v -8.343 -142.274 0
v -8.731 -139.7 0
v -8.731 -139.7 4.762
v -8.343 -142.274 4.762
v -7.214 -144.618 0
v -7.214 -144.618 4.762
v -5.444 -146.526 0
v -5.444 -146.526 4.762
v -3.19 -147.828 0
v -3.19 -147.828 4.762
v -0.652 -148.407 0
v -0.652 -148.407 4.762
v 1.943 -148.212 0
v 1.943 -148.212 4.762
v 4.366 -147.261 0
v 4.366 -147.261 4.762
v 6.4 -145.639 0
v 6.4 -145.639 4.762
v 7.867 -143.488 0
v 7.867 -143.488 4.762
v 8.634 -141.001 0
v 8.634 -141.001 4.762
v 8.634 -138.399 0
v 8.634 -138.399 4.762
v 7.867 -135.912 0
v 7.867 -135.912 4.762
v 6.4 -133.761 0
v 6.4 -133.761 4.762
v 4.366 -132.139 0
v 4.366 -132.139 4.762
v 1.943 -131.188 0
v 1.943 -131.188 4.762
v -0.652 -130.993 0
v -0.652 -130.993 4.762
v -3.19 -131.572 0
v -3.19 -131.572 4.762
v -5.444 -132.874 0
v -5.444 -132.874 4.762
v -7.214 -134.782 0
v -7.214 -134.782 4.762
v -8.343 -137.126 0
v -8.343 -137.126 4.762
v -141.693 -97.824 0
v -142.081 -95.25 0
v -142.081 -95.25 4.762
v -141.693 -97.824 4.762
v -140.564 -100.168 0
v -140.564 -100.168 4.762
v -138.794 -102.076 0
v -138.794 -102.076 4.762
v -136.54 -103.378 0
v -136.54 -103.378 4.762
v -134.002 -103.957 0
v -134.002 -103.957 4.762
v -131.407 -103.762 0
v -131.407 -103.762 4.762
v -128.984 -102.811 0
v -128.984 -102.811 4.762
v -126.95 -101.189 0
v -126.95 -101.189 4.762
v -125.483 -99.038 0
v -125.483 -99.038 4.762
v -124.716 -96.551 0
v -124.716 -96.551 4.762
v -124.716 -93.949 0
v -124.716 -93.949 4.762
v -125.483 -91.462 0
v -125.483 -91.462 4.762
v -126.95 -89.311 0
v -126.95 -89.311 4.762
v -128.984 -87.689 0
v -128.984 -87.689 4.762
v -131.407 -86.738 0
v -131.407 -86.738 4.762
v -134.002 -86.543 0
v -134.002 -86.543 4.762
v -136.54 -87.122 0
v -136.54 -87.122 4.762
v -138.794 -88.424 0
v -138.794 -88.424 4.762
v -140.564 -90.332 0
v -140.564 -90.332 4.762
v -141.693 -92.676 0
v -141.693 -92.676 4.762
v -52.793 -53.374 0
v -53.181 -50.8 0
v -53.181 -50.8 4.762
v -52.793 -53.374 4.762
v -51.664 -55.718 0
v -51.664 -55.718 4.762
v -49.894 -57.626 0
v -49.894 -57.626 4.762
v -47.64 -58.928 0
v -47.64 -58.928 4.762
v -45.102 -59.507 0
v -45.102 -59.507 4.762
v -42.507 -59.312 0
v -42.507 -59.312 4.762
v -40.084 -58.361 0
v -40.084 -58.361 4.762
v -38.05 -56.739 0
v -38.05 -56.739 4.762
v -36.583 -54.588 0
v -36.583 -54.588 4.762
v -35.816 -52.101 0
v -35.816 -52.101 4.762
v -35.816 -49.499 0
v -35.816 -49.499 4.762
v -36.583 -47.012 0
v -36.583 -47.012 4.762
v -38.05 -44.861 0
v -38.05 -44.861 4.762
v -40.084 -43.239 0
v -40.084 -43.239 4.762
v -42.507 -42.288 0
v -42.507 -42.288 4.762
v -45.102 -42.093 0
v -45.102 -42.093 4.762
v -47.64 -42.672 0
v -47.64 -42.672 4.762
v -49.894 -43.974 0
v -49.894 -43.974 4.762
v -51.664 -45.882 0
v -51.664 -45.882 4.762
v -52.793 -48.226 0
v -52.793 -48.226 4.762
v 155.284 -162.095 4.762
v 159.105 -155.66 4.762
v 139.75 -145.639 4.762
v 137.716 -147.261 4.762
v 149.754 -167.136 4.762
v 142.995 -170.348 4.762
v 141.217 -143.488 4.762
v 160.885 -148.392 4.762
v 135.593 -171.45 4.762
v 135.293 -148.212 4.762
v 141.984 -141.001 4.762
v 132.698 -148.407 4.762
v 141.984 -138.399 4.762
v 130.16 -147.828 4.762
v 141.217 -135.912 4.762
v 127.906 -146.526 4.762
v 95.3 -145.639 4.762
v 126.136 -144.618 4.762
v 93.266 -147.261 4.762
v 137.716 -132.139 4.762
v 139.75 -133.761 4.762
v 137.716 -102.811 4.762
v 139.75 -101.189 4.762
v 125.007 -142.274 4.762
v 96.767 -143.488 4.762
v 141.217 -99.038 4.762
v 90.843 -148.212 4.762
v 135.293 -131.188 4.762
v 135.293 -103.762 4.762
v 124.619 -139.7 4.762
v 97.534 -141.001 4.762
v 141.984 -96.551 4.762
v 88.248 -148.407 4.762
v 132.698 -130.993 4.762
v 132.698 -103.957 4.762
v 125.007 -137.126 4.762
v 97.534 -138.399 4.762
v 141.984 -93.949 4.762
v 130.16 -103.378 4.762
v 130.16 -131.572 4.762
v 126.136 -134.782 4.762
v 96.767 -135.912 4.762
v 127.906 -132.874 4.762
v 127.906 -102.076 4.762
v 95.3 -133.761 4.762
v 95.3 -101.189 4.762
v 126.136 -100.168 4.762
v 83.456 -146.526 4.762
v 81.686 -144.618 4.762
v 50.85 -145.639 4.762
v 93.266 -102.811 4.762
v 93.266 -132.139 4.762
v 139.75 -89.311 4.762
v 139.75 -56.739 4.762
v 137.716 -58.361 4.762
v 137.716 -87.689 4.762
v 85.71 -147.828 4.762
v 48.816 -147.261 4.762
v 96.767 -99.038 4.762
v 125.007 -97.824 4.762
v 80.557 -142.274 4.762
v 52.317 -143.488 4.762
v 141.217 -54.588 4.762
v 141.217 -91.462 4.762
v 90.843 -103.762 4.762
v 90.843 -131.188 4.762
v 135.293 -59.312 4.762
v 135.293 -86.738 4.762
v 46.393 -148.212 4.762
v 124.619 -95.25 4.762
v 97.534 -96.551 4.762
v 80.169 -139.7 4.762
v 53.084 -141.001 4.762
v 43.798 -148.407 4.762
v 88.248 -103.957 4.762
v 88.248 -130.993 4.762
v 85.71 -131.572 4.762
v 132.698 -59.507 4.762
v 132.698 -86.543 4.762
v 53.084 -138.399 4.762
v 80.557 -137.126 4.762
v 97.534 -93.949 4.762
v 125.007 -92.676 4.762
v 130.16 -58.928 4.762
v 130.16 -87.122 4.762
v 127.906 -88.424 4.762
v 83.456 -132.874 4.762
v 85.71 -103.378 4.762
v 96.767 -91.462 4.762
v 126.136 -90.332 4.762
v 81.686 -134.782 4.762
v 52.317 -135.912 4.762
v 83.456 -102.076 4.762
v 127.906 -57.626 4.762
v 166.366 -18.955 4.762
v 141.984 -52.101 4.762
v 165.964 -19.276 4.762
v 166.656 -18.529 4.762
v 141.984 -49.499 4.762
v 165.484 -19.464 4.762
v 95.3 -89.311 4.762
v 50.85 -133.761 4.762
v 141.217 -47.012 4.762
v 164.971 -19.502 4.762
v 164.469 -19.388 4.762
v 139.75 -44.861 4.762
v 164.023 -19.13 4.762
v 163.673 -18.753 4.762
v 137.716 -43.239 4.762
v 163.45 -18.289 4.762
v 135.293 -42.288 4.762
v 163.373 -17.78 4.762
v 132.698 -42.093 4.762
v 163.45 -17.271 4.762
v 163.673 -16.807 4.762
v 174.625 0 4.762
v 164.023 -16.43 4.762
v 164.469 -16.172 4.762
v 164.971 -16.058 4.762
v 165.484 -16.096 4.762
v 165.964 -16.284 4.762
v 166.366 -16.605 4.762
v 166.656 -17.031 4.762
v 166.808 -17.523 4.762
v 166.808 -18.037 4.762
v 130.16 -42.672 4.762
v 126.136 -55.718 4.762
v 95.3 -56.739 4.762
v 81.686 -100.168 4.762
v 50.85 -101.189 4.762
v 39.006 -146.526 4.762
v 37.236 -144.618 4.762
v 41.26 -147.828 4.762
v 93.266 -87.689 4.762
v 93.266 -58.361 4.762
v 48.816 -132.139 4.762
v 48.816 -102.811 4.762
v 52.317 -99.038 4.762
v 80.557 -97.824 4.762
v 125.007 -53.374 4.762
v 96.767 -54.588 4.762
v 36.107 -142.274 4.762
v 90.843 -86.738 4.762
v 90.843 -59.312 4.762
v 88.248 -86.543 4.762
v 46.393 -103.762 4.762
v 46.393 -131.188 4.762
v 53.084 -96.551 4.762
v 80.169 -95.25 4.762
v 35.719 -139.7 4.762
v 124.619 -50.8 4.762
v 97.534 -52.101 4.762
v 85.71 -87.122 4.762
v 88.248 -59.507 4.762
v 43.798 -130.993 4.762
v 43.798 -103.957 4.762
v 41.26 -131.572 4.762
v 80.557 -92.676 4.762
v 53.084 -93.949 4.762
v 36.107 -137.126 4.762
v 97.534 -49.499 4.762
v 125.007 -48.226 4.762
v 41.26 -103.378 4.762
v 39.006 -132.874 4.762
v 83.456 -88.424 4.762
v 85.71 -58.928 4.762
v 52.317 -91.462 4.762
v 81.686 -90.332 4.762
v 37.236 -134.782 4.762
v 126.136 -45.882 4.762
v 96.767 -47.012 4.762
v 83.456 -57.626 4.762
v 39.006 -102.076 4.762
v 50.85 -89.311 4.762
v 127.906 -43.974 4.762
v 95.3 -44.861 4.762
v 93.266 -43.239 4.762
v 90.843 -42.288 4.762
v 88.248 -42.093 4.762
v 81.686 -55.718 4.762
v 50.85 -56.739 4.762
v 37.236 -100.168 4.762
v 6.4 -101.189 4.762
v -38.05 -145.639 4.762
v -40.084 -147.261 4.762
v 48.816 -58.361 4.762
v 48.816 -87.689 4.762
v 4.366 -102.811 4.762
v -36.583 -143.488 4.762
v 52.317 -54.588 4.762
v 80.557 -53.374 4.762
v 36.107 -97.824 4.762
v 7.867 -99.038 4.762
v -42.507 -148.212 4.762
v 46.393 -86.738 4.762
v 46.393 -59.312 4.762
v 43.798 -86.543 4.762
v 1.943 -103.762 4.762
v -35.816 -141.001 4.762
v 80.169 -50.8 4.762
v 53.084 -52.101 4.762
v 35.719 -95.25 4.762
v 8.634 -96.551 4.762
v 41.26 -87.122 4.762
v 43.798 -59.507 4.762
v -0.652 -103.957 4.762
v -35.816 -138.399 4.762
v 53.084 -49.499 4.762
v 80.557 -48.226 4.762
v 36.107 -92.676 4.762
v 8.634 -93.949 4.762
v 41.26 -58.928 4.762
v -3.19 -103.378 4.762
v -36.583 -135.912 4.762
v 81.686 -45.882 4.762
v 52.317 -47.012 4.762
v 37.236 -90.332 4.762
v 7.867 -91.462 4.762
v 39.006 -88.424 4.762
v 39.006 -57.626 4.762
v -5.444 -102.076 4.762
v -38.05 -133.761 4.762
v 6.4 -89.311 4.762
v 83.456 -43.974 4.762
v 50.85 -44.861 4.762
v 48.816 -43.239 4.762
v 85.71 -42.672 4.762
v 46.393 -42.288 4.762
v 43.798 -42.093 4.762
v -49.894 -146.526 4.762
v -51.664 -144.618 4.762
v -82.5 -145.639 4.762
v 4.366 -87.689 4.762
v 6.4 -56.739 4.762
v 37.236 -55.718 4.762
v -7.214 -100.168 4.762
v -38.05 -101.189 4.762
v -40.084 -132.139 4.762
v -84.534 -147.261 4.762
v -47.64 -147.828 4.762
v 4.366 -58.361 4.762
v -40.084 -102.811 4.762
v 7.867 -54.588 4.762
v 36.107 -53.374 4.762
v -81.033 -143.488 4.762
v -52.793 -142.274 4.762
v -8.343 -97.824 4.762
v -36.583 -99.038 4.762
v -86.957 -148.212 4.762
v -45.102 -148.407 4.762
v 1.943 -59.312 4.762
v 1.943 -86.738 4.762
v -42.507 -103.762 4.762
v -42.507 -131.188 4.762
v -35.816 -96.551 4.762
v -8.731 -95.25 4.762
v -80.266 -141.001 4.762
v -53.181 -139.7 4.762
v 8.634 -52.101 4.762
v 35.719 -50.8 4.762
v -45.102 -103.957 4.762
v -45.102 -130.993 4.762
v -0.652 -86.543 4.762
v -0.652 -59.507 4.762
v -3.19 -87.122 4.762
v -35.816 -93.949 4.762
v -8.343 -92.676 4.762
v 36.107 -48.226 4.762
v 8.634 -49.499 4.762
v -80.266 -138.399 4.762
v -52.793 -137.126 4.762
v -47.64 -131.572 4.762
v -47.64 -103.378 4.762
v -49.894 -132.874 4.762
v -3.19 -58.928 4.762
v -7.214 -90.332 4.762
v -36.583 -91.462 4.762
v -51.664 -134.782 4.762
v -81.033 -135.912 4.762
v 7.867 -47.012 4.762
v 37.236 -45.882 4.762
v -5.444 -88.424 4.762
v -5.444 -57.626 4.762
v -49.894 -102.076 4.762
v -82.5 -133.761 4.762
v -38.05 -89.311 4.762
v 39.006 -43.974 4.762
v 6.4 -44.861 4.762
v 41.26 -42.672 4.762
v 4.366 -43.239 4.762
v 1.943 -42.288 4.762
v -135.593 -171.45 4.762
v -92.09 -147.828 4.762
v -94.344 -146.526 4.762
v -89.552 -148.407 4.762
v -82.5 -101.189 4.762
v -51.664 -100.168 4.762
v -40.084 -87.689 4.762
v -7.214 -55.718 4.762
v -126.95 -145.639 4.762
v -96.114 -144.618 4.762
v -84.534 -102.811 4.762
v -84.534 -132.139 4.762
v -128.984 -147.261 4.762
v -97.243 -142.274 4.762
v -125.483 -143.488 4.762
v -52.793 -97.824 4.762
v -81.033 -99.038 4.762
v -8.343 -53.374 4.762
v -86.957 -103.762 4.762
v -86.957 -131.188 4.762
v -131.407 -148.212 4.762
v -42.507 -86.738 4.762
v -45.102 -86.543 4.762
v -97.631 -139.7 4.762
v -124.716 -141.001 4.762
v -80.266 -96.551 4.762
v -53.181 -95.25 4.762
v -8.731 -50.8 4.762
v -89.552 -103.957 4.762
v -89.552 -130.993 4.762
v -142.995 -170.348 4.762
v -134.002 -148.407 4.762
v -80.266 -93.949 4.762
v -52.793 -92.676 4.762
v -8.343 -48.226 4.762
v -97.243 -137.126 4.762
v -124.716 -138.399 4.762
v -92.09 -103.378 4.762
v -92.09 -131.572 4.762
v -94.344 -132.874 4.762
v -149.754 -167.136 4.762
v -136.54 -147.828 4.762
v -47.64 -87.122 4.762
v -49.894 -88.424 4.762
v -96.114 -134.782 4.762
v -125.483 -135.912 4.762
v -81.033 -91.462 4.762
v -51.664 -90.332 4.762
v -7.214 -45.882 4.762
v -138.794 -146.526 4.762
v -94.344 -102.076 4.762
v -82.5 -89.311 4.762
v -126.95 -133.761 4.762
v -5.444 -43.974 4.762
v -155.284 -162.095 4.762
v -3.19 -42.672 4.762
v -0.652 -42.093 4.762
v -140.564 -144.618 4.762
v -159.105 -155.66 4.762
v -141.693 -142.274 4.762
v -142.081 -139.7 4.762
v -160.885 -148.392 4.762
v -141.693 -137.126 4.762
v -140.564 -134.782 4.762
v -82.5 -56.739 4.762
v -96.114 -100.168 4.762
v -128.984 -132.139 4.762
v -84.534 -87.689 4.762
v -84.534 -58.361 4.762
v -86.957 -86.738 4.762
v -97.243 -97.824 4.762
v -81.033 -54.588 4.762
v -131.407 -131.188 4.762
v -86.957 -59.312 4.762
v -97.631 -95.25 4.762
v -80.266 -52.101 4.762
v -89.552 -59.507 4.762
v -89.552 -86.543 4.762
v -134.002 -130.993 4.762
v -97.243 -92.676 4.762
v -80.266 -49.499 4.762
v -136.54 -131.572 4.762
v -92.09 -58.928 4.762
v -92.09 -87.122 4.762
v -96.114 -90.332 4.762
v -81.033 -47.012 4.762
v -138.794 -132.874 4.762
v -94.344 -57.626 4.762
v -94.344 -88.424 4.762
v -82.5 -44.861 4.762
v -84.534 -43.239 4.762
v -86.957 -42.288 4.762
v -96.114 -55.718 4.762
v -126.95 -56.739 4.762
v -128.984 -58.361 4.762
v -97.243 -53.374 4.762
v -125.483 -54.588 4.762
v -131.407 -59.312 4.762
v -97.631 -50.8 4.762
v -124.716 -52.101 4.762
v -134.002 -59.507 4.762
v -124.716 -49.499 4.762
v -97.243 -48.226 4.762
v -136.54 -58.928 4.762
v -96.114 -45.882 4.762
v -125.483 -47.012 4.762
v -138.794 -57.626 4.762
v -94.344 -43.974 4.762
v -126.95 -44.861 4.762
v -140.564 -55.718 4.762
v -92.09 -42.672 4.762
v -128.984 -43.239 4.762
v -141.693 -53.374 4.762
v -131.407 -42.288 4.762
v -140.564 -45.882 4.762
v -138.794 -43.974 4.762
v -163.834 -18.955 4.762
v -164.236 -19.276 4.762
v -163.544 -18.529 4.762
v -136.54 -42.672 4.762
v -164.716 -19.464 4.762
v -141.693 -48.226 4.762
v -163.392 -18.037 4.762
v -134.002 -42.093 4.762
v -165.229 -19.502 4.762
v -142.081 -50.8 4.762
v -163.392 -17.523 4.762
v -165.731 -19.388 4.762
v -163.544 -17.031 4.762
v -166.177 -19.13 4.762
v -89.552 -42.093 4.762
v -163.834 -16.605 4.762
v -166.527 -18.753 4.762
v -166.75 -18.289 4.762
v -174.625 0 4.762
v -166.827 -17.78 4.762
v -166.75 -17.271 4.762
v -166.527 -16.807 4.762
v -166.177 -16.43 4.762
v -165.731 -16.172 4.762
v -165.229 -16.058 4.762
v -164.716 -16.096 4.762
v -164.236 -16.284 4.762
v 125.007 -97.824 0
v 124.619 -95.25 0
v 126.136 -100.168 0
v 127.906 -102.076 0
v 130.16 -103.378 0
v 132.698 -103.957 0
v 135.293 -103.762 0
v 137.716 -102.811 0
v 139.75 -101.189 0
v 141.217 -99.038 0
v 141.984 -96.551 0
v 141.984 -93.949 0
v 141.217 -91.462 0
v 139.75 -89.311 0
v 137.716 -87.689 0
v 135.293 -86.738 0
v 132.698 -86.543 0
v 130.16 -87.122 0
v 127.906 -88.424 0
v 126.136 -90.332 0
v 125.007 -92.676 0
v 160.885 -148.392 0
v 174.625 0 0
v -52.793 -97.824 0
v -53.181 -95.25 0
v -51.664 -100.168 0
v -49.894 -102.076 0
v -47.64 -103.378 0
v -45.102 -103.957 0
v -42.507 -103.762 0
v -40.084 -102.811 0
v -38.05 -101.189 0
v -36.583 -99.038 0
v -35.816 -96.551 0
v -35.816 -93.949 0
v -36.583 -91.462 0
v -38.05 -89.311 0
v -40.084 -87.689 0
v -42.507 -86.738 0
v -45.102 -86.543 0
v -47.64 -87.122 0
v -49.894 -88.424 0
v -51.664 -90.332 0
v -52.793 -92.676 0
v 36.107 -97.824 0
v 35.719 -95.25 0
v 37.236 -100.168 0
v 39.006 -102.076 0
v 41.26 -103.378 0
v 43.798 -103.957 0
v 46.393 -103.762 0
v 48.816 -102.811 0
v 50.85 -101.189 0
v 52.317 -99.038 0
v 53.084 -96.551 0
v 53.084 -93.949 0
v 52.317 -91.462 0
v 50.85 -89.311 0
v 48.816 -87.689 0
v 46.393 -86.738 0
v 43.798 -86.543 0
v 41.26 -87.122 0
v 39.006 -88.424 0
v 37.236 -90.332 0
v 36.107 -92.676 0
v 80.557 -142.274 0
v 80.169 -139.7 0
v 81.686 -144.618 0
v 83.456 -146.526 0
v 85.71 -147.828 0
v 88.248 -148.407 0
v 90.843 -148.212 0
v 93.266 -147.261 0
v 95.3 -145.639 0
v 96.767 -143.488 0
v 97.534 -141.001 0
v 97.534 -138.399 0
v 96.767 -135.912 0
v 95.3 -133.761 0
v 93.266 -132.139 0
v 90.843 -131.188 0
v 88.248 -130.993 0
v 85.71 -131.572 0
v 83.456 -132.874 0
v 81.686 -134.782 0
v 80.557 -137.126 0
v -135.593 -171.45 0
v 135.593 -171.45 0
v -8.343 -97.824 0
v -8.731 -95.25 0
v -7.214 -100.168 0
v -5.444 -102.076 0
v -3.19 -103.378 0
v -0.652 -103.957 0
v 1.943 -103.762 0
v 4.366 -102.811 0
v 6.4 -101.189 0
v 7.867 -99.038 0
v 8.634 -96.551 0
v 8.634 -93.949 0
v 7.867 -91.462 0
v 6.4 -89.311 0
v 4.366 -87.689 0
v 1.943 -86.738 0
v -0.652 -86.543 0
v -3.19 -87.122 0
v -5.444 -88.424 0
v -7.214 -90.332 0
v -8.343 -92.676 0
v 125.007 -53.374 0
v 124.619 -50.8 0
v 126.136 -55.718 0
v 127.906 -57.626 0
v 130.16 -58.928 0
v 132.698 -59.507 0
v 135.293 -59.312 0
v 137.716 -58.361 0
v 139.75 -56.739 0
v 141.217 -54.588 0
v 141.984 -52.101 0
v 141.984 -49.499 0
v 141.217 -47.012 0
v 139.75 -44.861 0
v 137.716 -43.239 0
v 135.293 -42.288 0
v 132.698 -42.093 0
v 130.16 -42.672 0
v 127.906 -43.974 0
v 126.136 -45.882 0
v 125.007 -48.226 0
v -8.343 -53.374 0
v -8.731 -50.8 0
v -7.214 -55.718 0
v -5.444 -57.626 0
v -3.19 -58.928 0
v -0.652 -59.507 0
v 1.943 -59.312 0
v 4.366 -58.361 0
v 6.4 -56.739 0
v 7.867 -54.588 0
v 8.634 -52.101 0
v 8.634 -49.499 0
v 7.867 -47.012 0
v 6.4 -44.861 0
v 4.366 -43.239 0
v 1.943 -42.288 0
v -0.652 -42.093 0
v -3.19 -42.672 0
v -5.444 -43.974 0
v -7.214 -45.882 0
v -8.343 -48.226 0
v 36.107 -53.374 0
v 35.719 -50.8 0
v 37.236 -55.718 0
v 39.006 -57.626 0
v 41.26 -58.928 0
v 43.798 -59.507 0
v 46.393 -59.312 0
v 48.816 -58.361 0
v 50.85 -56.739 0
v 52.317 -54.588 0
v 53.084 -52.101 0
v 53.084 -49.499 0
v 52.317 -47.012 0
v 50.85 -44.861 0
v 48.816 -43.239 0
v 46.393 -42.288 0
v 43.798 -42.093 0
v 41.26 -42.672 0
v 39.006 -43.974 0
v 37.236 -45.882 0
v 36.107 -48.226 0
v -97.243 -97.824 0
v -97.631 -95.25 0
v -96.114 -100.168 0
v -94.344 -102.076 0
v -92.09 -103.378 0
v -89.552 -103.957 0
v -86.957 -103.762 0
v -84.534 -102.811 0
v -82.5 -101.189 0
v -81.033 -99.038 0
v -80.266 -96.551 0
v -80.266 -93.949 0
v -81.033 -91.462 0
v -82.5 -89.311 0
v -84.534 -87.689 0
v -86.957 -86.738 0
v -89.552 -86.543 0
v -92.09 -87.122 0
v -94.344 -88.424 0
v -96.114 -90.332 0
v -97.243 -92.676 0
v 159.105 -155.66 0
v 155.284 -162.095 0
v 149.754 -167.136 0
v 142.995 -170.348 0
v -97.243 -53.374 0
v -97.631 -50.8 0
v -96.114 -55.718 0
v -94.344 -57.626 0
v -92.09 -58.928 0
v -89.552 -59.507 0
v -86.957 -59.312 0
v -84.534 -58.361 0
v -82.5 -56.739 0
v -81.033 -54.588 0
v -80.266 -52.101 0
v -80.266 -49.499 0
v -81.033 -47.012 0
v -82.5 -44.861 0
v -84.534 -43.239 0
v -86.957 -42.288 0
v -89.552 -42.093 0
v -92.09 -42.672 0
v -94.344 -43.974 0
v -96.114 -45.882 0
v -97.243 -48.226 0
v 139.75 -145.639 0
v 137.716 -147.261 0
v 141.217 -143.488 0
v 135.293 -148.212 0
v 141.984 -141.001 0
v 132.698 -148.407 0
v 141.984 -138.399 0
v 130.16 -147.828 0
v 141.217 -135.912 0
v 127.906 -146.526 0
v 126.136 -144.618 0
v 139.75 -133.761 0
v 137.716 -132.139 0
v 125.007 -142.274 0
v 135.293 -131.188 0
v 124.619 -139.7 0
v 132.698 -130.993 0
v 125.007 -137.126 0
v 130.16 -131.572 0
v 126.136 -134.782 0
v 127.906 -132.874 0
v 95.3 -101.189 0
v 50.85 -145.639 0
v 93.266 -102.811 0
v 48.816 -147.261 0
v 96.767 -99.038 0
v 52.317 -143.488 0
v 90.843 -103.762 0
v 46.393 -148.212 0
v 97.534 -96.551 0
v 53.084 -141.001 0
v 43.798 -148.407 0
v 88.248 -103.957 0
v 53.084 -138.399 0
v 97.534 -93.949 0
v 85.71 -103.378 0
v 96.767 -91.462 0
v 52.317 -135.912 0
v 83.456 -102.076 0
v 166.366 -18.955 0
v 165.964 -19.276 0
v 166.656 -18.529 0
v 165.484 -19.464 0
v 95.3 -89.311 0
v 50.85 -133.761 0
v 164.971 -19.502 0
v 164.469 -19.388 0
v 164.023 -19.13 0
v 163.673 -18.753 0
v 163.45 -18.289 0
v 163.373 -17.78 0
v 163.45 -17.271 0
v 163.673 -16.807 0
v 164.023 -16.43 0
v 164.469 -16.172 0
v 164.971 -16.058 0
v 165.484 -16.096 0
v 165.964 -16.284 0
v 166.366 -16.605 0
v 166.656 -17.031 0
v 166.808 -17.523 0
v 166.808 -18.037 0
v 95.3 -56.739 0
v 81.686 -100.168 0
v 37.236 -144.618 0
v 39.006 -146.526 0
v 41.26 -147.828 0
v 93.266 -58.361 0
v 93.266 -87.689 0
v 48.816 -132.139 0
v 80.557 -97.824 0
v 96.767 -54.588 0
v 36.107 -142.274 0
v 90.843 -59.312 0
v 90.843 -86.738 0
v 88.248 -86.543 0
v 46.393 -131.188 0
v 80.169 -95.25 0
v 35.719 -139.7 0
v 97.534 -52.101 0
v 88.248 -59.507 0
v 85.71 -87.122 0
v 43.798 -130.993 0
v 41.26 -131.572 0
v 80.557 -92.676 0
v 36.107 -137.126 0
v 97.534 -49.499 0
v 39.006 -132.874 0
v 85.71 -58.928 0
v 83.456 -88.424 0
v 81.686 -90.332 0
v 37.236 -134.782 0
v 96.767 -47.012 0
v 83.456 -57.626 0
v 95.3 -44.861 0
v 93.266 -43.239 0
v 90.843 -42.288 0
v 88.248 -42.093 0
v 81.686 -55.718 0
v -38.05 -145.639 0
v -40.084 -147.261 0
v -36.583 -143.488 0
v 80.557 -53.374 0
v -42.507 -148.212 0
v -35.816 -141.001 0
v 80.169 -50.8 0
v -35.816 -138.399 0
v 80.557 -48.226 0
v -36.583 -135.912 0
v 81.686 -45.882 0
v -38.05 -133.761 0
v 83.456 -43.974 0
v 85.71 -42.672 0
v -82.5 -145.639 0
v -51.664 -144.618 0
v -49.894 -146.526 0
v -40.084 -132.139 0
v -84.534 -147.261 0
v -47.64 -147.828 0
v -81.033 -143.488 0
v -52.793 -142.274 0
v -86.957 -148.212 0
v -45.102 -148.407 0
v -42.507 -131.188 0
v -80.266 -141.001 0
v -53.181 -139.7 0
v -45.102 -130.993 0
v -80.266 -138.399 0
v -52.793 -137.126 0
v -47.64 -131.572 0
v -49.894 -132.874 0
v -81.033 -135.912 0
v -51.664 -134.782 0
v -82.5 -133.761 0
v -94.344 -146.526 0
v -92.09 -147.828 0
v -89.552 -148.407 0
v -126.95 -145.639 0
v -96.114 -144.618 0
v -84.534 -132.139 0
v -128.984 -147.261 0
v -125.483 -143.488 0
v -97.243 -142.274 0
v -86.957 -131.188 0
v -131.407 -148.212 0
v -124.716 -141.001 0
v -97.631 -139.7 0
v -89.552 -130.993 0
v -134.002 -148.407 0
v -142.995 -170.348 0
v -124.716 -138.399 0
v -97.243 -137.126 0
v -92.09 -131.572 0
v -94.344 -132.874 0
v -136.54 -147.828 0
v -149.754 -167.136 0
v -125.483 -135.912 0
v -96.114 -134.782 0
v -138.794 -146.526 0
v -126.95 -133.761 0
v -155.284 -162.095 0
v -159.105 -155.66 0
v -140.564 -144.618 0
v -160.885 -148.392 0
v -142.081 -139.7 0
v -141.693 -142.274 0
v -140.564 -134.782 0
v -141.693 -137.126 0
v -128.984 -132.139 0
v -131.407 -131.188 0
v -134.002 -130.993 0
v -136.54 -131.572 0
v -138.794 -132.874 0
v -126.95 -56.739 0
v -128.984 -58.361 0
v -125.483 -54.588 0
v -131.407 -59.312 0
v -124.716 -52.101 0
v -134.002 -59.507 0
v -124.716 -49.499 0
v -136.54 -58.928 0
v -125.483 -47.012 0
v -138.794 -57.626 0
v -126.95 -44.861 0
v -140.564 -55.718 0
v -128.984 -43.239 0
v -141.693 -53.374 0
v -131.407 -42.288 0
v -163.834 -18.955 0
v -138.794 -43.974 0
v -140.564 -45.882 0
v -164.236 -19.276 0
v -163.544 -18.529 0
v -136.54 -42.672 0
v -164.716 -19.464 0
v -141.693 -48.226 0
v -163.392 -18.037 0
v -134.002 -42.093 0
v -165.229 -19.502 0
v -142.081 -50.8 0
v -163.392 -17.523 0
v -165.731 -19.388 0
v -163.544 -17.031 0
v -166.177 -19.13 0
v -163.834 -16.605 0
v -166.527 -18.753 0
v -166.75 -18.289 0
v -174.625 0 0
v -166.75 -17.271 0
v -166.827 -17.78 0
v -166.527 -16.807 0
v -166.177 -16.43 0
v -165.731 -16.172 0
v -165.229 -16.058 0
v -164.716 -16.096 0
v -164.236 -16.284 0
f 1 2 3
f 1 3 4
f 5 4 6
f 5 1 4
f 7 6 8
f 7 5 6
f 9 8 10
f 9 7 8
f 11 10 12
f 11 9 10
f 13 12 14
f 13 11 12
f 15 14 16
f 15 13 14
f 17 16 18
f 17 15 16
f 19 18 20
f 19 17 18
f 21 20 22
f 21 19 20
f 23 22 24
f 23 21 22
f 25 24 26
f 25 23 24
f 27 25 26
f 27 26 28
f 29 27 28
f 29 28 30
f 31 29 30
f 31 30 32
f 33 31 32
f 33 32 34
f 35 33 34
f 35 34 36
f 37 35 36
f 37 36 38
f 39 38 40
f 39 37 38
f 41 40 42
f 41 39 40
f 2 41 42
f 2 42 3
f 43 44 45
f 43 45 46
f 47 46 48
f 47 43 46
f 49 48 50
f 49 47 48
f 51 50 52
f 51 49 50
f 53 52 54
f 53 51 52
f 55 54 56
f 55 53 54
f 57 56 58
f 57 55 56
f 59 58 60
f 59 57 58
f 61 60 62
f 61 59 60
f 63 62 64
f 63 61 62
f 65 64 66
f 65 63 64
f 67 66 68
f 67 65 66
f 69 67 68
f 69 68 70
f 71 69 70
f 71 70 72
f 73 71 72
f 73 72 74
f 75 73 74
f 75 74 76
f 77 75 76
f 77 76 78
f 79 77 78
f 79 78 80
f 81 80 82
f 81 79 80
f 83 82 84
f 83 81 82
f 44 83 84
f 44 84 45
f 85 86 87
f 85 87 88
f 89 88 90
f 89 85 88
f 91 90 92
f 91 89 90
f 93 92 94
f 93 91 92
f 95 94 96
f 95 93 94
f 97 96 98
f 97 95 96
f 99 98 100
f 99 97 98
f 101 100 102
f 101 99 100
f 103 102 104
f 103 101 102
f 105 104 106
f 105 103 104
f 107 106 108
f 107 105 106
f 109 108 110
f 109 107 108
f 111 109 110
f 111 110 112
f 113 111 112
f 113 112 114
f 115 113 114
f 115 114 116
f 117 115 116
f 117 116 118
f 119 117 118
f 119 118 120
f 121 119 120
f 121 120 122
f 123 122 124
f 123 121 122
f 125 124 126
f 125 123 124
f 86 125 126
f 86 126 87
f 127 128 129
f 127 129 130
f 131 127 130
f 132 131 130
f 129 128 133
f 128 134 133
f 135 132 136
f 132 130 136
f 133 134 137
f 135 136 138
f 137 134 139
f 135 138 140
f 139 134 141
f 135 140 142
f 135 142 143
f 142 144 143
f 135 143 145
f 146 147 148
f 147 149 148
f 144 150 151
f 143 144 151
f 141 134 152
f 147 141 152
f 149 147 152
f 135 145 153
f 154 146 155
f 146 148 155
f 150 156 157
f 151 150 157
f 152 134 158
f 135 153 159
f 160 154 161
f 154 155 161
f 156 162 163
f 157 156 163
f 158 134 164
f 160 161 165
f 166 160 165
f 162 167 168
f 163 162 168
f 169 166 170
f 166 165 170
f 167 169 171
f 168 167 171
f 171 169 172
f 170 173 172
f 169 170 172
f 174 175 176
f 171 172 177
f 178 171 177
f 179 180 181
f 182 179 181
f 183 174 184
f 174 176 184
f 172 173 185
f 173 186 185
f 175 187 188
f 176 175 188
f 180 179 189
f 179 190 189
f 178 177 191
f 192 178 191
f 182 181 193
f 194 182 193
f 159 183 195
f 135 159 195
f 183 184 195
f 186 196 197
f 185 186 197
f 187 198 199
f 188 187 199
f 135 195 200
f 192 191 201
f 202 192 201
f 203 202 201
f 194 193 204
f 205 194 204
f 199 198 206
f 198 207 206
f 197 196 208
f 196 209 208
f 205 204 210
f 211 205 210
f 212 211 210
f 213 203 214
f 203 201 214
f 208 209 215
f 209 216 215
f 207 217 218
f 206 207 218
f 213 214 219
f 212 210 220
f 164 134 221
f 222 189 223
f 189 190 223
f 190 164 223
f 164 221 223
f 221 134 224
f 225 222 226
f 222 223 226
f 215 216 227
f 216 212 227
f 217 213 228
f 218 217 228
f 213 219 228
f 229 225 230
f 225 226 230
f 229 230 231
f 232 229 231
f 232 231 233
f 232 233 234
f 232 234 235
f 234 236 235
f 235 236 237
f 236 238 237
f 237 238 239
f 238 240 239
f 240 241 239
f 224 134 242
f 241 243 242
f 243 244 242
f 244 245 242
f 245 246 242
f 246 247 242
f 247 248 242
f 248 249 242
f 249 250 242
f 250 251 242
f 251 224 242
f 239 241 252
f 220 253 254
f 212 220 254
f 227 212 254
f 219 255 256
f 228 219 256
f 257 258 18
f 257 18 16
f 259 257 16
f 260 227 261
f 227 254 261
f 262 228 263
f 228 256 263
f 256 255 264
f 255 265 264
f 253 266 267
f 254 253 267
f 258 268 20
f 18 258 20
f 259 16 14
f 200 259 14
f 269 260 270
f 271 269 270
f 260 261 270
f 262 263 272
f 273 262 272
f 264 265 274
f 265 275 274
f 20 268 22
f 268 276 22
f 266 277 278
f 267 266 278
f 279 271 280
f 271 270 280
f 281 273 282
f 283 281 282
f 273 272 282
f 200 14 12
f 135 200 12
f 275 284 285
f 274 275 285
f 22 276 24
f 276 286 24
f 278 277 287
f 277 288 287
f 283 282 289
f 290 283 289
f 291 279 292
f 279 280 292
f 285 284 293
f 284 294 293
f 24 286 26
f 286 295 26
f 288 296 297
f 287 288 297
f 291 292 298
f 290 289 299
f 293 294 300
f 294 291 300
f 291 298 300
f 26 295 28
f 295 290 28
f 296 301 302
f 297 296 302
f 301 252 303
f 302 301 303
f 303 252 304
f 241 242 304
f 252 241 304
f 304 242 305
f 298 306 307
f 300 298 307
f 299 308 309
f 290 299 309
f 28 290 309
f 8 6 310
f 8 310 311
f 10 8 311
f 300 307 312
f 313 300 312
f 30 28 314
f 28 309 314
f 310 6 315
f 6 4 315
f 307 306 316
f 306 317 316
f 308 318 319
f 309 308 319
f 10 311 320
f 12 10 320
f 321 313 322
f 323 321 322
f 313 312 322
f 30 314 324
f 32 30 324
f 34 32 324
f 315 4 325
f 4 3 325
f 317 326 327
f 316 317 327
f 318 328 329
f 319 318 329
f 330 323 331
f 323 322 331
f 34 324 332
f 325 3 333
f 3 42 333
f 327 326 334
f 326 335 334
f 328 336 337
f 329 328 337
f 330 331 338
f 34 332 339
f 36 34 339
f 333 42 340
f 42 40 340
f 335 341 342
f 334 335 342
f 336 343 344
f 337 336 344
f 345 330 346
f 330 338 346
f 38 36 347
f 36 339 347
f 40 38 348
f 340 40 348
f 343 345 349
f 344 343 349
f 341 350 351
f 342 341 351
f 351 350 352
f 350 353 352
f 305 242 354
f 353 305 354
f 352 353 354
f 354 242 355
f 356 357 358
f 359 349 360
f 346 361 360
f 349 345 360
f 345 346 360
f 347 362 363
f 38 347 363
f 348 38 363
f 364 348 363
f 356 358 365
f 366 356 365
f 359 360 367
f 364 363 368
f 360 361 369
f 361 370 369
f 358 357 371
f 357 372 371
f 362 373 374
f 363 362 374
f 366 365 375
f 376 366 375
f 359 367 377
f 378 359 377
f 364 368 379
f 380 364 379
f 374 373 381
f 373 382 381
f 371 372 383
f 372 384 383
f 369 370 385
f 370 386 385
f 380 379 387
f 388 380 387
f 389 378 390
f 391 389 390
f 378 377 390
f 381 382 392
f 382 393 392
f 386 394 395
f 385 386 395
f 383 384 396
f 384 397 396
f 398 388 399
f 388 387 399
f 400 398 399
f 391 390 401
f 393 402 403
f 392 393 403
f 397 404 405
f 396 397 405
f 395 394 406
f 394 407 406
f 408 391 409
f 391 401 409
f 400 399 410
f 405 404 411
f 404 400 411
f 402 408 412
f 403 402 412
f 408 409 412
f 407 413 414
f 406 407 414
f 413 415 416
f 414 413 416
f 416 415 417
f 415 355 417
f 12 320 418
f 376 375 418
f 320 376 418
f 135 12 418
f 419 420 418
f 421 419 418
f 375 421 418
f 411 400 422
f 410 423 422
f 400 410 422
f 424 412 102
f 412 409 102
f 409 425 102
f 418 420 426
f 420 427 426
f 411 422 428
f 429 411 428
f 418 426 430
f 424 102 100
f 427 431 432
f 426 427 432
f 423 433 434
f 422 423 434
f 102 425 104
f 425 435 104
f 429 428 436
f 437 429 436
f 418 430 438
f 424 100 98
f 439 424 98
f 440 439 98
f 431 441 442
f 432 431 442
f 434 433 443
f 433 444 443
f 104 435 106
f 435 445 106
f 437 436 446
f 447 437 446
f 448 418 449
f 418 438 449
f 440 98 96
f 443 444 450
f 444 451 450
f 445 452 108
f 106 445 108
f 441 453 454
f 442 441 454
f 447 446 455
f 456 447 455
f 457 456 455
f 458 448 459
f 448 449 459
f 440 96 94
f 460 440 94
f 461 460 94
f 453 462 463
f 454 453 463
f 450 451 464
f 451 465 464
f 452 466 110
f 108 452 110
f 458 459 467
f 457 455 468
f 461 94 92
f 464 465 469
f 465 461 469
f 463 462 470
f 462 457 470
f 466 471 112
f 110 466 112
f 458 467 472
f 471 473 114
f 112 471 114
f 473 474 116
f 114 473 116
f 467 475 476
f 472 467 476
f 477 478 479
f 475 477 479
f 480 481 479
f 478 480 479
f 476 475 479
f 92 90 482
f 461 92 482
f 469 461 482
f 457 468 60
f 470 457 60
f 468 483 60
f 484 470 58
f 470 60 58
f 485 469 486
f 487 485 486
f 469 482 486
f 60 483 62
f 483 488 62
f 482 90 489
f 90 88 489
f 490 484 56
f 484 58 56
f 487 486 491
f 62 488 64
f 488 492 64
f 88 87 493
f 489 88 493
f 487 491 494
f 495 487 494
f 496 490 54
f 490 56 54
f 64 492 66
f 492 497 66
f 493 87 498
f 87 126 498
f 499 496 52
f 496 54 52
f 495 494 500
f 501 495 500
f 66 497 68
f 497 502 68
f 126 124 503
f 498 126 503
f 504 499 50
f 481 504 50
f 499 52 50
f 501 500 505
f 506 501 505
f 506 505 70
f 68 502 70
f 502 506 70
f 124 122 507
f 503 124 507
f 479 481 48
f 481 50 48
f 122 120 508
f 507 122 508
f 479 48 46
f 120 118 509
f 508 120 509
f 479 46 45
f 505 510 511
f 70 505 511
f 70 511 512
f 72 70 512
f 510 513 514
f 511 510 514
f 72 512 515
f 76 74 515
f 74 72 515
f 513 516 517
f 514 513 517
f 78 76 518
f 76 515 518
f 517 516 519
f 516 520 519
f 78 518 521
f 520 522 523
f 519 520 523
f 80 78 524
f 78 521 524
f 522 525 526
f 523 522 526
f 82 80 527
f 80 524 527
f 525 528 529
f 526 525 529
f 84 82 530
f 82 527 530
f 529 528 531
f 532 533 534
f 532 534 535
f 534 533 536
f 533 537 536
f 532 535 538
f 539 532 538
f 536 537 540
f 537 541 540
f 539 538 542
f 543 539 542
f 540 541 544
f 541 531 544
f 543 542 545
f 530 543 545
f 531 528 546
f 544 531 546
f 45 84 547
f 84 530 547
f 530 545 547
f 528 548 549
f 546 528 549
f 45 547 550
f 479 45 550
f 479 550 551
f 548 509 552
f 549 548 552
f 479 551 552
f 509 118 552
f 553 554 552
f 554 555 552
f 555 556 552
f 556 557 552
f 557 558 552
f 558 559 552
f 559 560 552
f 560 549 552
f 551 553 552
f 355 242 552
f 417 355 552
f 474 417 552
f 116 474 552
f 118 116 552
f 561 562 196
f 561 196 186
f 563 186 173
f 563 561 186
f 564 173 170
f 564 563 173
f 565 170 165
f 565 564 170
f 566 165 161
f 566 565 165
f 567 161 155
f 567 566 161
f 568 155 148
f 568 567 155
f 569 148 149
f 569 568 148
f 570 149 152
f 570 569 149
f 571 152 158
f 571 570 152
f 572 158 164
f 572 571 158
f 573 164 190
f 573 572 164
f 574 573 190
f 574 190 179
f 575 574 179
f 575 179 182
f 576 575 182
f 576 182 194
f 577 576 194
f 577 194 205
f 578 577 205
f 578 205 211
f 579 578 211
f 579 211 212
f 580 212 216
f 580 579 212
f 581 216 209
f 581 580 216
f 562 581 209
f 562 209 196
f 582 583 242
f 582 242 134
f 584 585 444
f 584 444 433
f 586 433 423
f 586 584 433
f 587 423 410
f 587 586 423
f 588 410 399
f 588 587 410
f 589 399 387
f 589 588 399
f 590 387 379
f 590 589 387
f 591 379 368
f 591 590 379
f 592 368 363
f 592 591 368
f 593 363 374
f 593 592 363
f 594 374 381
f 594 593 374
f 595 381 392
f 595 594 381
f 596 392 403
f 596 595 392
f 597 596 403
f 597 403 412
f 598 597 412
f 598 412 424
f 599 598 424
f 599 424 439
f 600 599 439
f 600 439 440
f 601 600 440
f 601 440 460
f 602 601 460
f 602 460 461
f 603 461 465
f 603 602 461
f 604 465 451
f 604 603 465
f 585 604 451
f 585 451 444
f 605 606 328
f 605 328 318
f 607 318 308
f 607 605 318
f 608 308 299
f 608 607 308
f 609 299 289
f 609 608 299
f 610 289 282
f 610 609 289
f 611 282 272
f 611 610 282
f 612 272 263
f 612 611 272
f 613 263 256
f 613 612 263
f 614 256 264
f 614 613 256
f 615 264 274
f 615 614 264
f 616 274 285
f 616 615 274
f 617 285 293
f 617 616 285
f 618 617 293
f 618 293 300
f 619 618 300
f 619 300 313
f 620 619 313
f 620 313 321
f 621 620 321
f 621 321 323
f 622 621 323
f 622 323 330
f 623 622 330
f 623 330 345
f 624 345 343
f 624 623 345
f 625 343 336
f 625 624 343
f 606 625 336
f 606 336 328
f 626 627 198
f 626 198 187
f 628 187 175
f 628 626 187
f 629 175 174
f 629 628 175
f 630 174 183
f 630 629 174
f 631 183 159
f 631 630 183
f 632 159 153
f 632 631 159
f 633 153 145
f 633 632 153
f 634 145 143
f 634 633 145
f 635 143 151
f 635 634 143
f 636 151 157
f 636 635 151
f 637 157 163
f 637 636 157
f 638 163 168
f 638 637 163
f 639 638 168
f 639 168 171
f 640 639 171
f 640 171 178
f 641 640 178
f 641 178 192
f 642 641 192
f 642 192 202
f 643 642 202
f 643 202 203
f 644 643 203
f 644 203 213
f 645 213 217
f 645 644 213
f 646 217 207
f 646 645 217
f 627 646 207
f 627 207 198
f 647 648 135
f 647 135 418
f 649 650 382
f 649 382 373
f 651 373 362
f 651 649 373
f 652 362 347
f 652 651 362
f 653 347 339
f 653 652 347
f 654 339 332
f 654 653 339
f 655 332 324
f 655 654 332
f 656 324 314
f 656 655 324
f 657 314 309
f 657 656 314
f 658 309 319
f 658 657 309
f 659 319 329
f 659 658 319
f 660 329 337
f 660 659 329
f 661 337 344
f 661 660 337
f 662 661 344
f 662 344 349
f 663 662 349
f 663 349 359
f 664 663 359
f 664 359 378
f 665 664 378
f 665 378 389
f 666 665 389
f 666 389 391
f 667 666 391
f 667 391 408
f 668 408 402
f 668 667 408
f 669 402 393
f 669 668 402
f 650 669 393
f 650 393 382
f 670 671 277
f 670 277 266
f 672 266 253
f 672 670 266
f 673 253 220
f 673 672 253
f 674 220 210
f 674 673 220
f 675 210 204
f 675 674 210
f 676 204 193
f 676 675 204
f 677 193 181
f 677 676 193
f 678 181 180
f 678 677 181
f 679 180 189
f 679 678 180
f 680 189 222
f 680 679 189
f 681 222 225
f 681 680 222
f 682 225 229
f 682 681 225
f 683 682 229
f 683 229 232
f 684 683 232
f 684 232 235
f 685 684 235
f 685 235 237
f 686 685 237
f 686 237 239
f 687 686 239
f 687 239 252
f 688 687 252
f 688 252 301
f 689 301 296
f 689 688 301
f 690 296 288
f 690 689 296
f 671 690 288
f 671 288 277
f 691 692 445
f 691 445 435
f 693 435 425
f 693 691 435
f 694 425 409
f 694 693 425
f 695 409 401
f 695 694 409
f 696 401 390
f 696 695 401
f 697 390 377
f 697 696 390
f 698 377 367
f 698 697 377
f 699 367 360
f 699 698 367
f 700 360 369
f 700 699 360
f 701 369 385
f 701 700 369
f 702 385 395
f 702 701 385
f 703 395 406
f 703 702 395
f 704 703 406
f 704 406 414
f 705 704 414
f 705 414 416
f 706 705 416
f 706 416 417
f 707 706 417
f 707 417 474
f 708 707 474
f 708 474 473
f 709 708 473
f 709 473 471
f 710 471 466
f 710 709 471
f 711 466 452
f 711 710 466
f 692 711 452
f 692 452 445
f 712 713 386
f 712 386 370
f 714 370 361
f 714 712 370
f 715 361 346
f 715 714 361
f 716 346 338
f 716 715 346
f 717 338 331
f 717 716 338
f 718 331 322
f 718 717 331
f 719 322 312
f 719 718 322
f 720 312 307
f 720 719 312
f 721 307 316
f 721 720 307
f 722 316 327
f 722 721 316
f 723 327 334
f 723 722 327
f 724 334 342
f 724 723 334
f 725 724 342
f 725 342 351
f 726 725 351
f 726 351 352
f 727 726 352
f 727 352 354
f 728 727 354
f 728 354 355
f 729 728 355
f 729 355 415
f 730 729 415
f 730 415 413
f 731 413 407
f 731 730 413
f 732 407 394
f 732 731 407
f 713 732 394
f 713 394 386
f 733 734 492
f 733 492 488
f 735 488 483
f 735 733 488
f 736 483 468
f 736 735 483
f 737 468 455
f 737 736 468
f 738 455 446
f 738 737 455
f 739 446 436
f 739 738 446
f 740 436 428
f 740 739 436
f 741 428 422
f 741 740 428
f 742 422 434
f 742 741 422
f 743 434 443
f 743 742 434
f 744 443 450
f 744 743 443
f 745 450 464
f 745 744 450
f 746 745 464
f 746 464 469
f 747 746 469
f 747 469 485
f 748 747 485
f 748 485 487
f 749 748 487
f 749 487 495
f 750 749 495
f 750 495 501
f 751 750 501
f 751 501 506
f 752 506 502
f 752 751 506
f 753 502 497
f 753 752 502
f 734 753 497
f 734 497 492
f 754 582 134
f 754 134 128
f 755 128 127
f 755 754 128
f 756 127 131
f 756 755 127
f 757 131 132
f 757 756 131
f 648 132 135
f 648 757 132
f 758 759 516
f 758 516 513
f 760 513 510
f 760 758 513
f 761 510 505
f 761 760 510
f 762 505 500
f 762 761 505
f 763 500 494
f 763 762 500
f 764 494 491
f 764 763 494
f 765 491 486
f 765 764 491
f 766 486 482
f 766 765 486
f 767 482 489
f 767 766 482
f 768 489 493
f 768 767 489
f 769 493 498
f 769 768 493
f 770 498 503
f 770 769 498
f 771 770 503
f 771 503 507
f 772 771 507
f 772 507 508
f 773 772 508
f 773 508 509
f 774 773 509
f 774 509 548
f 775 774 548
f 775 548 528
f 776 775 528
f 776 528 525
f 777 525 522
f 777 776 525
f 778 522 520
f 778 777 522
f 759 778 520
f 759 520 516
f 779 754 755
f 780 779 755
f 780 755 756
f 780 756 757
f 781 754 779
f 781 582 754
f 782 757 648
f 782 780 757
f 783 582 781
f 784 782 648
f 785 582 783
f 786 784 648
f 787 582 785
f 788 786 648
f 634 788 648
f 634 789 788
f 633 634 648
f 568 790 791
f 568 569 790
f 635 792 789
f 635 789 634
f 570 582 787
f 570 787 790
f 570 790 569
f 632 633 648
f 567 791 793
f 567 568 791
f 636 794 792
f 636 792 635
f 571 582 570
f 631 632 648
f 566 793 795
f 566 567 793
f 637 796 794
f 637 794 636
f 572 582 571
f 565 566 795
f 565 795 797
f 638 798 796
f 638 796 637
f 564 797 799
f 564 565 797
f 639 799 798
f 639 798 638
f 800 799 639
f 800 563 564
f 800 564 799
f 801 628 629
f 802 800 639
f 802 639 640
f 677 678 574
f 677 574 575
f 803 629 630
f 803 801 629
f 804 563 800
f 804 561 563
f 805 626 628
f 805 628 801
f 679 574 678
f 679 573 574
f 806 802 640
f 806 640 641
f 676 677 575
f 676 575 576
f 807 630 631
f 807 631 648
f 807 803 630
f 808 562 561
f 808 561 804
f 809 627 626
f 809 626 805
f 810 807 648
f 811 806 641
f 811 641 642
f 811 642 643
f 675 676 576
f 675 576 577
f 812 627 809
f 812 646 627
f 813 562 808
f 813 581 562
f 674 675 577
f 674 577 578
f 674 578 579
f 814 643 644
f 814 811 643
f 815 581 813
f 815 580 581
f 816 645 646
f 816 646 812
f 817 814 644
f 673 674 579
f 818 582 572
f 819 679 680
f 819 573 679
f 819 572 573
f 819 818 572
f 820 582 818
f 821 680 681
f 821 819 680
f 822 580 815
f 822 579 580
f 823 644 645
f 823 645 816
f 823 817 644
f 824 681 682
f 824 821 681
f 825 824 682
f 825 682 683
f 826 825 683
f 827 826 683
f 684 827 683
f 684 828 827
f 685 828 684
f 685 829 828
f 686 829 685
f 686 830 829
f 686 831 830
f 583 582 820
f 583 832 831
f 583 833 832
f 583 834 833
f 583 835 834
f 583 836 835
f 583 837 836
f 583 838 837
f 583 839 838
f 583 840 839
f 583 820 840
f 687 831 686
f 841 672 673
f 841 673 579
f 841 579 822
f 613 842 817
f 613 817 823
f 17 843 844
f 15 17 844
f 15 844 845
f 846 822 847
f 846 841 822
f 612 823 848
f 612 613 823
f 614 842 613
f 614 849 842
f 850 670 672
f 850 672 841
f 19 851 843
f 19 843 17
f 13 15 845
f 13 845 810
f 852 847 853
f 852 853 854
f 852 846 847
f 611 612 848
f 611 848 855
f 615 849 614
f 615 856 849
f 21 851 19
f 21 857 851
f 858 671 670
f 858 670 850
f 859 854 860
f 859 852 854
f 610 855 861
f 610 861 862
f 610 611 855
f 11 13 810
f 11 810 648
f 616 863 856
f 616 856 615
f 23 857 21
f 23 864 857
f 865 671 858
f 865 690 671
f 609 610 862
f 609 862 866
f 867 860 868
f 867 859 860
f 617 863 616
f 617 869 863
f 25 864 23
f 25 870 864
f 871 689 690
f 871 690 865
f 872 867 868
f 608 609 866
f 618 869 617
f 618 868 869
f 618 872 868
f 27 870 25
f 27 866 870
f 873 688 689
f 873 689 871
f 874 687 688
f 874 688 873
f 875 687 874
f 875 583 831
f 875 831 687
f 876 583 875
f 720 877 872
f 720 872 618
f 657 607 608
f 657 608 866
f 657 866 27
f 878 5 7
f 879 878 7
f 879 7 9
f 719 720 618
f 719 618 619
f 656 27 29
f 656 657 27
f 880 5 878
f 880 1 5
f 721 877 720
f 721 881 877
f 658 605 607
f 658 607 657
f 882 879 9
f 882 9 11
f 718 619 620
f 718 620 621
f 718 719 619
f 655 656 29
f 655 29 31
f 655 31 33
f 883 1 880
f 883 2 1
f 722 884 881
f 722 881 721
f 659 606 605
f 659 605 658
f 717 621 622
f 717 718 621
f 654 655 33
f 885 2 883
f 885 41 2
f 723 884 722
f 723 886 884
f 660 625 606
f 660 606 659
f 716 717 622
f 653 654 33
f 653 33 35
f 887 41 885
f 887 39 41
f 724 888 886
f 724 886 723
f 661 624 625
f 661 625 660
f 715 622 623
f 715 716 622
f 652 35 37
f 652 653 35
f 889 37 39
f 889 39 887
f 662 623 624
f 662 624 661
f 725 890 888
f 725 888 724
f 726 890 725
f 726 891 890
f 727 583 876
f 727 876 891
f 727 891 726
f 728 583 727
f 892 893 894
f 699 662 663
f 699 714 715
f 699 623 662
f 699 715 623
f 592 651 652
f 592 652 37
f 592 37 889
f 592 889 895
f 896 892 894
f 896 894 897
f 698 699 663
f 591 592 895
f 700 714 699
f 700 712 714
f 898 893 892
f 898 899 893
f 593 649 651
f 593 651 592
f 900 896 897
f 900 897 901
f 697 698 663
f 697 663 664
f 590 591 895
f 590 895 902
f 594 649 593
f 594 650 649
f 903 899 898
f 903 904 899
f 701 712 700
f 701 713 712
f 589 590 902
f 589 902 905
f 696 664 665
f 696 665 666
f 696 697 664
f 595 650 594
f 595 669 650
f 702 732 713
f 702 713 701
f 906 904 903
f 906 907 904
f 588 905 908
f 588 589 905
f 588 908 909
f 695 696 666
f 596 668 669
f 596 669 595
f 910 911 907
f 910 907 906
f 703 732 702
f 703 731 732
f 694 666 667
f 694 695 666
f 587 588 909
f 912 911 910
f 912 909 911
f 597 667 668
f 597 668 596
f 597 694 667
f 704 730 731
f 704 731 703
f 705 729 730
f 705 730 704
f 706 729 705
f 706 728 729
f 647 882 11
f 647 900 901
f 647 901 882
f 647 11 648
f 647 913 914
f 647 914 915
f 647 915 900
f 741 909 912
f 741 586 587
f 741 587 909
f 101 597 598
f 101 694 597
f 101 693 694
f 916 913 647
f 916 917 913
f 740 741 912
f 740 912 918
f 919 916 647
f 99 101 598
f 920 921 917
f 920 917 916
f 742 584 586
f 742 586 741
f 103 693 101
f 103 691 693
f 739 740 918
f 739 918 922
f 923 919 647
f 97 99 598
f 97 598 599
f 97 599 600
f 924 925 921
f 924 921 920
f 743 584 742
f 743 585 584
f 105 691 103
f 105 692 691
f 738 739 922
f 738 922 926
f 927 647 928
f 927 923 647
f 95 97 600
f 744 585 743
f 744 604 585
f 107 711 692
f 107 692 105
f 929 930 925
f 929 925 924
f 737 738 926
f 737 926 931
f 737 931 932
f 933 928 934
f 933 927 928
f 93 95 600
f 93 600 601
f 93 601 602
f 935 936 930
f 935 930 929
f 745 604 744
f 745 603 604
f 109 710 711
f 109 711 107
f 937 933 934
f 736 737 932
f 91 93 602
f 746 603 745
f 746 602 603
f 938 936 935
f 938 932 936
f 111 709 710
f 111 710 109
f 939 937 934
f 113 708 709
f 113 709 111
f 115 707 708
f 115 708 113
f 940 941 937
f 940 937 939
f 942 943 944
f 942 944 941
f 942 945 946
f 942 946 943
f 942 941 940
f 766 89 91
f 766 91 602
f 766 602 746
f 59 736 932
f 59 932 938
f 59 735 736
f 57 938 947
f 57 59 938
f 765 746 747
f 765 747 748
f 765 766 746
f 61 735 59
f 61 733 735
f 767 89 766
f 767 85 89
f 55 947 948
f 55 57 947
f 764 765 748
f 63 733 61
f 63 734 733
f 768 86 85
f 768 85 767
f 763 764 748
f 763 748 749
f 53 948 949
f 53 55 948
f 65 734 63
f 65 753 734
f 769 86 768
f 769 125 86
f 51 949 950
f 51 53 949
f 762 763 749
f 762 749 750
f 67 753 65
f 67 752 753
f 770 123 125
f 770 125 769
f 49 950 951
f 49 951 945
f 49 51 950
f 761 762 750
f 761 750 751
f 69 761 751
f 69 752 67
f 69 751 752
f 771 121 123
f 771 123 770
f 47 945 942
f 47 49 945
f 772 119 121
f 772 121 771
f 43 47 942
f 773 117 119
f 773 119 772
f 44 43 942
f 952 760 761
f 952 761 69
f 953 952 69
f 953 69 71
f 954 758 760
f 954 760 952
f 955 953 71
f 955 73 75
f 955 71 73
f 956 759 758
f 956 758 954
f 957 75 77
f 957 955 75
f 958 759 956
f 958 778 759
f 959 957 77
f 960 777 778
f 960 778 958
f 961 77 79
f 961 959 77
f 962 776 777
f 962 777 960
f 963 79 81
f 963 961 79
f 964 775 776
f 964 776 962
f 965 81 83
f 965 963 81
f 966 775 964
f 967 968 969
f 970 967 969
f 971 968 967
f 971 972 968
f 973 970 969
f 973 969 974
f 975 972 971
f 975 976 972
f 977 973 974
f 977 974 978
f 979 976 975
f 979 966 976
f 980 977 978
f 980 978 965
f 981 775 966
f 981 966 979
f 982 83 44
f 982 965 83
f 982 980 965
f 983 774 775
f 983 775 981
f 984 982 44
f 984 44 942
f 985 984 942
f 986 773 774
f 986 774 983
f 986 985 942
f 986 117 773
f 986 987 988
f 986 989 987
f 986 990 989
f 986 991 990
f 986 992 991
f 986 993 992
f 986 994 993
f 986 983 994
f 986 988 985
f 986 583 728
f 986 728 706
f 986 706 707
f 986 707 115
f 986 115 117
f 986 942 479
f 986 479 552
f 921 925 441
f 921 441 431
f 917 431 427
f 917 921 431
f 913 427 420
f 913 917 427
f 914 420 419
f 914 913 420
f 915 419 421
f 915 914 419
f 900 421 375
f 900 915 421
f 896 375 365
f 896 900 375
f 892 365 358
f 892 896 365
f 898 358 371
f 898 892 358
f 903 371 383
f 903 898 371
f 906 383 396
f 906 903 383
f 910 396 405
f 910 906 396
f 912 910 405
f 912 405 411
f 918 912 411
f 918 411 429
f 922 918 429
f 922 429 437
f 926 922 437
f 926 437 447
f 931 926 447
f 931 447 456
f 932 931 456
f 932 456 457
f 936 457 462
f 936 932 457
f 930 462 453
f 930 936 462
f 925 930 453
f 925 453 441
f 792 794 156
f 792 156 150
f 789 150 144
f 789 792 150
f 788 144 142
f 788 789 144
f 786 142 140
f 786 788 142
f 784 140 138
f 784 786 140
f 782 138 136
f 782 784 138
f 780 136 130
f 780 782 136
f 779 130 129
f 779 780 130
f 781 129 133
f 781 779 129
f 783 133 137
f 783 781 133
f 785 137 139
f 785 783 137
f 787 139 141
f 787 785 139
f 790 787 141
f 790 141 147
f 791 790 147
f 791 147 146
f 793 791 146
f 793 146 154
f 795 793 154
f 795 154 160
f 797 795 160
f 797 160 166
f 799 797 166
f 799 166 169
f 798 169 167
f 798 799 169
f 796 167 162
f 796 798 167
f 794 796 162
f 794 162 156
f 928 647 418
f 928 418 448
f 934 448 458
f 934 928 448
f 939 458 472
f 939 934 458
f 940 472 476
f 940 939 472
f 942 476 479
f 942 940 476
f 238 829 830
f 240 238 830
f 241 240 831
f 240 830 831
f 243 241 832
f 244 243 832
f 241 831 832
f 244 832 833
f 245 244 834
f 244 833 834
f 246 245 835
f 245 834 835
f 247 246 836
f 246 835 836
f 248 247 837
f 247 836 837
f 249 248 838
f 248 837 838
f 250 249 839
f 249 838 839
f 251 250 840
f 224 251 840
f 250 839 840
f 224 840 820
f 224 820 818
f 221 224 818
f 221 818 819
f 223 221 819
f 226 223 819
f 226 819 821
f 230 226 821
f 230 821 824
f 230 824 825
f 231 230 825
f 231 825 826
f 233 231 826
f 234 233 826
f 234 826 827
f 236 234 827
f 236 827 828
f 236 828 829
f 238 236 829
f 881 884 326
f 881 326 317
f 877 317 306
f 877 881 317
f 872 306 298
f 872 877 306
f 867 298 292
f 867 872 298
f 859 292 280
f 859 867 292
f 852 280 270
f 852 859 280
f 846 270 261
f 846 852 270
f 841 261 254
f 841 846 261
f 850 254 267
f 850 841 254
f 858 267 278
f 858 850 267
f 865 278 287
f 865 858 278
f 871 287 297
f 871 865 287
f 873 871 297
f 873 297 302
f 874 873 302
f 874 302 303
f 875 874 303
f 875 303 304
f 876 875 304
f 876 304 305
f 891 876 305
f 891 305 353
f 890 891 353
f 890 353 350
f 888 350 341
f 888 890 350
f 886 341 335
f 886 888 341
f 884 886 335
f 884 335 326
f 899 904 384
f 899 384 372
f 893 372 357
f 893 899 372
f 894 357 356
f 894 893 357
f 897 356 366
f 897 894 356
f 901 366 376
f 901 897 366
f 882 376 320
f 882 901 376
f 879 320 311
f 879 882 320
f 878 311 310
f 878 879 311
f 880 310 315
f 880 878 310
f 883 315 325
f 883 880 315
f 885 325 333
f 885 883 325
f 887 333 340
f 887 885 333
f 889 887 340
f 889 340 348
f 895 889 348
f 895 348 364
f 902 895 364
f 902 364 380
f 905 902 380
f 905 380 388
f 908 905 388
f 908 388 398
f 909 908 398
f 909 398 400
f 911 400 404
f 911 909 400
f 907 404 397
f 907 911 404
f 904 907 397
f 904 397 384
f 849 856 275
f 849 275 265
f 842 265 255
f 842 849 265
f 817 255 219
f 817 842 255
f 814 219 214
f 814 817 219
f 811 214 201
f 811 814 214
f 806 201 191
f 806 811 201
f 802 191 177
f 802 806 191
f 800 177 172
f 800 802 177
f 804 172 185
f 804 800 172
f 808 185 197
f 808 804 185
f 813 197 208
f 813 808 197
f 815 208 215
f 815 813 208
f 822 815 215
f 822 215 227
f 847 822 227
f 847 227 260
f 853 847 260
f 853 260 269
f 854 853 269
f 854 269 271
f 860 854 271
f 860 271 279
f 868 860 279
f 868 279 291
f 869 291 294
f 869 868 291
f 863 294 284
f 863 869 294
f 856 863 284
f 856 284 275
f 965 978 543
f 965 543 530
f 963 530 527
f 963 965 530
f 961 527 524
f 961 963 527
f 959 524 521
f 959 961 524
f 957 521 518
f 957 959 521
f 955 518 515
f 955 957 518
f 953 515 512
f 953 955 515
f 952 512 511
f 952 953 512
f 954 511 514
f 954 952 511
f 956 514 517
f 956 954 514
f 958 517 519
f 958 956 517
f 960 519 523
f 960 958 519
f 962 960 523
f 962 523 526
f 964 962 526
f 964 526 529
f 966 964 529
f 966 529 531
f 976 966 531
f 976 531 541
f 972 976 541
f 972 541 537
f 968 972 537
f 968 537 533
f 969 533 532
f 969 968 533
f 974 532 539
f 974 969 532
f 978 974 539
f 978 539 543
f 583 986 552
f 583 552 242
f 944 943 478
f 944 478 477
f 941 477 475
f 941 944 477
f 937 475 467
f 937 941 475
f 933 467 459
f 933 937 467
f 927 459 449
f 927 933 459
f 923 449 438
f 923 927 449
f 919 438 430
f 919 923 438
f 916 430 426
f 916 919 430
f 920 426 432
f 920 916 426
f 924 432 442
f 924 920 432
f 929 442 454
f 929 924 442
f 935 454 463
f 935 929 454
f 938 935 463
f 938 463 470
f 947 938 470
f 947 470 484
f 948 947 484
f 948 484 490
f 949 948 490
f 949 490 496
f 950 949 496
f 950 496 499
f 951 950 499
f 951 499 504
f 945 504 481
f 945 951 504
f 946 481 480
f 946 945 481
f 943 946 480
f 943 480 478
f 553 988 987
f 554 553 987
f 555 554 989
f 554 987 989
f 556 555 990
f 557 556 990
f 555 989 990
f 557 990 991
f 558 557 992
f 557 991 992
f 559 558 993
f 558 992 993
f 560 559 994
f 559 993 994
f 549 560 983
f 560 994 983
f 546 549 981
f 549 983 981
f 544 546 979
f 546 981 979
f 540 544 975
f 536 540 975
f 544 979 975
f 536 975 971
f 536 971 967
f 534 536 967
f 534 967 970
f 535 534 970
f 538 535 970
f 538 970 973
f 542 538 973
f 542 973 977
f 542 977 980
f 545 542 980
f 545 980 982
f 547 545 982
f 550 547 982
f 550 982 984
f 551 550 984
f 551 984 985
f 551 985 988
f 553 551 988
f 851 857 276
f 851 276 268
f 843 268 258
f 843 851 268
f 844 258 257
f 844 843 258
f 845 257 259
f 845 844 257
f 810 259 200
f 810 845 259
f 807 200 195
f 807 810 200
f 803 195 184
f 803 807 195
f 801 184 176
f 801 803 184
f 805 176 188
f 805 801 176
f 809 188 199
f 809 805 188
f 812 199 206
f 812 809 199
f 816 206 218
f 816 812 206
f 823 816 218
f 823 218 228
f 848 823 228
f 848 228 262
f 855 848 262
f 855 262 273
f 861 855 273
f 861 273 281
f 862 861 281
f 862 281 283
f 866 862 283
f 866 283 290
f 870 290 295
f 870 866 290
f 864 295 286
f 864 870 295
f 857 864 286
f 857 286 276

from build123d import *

# Parameters (mm, degrees)
SKETCH1_R                 = 8.73125
BOSS_EXTRUDE1_DEPTH       = 4.7625
TAP_DRILL_FOR_8_32_TAP1_D = 3.4544


with BuildPart() as part:
    # Sketch1 → Boss-Extrude1 (new body)
    with BuildSketch(Plane.XY):
        with BuildLine():
            Line((-174.625, 0), (174.625, 0))
            Line((174.625, 0), (160.88501532, -148.391834548))
            ThreePointArc((160.88501532, -148.391834548), (152.705732731, -164.820223727), (135.593202199, -171.45))
            Line((135.593202199, -171.45), (-135.593202199, -171.45))
            ThreePointArc((-135.593202199, -171.45), (-152.705732731, -164.820223727), (-160.88501532, -148.391834548))
            Line((-160.88501532, -148.391834548), (-174.625, 0))
        make_face()
        with Locations(Location((-44.45, -139.7, 0), (0, 0, 180))):
            Circle(SKETCH1_R, mode=Mode.SUBTRACT)
        with Locations(Location((-88.9, -139.7, 0), (0, 0, 180))):
            Circle(SKETCH1_R, mode=Mode.SUBTRACT)
        with Locations(Location((-133.35, -139.7, 0), (0, 0, 180))):
            Circle(SKETCH1_R, mode=Mode.SUBTRACT)
        with Locations(Location((-88.9, -95.25, 0), (0, 0, 180))):
            Circle(SKETCH1_R, mode=Mode.SUBTRACT)
        with Locations(Location((-133.35, -95.25, 0), (0, 0, 180))):
            Circle(SKETCH1_R, mode=Mode.SUBTRACT)
        with Locations(Location((-88.9, -50.8, 0), (0, 0, 180))):
            Circle(SKETCH1_R, mode=Mode.SUBTRACT)
        with Locations(Location((-133.35, -50.8, 0), (0, 0, 180))):
            Circle(SKETCH1_R, mode=Mode.SUBTRACT)
        with Locations(Location((-44.45, -95.25, 0), (0, 0, 180))):
            Circle(SKETCH1_R, mode=Mode.SUBTRACT)
        with Locations(Location((-44.45, -50.8, 0), (0, 0, 180))):
            Circle(SKETCH1_R, mode=Mode.SUBTRACT)
        with Locations(Location((0, -139.7, 0), (0, 0, 180))):
            Circle(SKETCH1_R, mode=Mode.SUBTRACT)
        with Locations(Location((44.45, -139.7, 0), (0, 0, 180))):
            Circle(SKETCH1_R, mode=Mode.SUBTRACT)
        with Locations(Location((88.9, -139.7, 0), (0, 0, 180))):
            Circle(SKETCH1_R, mode=Mode.SUBTRACT)
        with Locations(Location((133.35, -139.7, 0), (0, 0, 180))):
            Circle(SKETCH1_R, mode=Mode.SUBTRACT)
        with Locations(Location((44.45, -95.25, 0), (0, 0, 180))):
            Circle(SKETCH1_R, mode=Mode.SUBTRACT)
        with Locations(Location((88.9, -95.25, 0), (0, 0, 180))):
            Circle(SKETCH1_R, mode=Mode.SUBTRACT)
        with Locations(Location((133.35, -95.25, 0), (0, 0, 180))):
            Circle(SKETCH1_R, mode=Mode.SUBTRACT)
        with Locations(Location((44.45, -50.8, 0), (0, 0, 180))):
            Circle(SKETCH1_R, mode=Mode.SUBTRACT)
        with Locations(Location((88.9, -50.8, 0), (0, 0, 180))):
            Circle(SKETCH1_R, mode=Mode.SUBTRACT)
        with Locations(Location((133.35, -50.8, 0), (0, 0, 180))):
            Circle(SKETCH1_R, mode=Mode.SUBTRACT)
        with Locations(Location((0, -95.25, 0), (0, 0, 180))):
            Circle(SKETCH1_R, mode=Mode.SUBTRACT)
        with Locations(Location((0, -50.8, 0), (0, 0, 180))):
            Circle(SKETCH1_R, mode=Mode.SUBTRACT)
    extrude(amount=BOSS_EXTRUDE1_DEPTH)

    # Tap Drill for #8-32 Tap1 (through all)
    with Locations(Plane.XY.offset(4.7625)):
        with Locations((165.1, -17.78), (-165.1, -17.78)):
            Hole(TAP_DRILL_FOR_8_32_TAP1_D / 2)


solid = part.part
